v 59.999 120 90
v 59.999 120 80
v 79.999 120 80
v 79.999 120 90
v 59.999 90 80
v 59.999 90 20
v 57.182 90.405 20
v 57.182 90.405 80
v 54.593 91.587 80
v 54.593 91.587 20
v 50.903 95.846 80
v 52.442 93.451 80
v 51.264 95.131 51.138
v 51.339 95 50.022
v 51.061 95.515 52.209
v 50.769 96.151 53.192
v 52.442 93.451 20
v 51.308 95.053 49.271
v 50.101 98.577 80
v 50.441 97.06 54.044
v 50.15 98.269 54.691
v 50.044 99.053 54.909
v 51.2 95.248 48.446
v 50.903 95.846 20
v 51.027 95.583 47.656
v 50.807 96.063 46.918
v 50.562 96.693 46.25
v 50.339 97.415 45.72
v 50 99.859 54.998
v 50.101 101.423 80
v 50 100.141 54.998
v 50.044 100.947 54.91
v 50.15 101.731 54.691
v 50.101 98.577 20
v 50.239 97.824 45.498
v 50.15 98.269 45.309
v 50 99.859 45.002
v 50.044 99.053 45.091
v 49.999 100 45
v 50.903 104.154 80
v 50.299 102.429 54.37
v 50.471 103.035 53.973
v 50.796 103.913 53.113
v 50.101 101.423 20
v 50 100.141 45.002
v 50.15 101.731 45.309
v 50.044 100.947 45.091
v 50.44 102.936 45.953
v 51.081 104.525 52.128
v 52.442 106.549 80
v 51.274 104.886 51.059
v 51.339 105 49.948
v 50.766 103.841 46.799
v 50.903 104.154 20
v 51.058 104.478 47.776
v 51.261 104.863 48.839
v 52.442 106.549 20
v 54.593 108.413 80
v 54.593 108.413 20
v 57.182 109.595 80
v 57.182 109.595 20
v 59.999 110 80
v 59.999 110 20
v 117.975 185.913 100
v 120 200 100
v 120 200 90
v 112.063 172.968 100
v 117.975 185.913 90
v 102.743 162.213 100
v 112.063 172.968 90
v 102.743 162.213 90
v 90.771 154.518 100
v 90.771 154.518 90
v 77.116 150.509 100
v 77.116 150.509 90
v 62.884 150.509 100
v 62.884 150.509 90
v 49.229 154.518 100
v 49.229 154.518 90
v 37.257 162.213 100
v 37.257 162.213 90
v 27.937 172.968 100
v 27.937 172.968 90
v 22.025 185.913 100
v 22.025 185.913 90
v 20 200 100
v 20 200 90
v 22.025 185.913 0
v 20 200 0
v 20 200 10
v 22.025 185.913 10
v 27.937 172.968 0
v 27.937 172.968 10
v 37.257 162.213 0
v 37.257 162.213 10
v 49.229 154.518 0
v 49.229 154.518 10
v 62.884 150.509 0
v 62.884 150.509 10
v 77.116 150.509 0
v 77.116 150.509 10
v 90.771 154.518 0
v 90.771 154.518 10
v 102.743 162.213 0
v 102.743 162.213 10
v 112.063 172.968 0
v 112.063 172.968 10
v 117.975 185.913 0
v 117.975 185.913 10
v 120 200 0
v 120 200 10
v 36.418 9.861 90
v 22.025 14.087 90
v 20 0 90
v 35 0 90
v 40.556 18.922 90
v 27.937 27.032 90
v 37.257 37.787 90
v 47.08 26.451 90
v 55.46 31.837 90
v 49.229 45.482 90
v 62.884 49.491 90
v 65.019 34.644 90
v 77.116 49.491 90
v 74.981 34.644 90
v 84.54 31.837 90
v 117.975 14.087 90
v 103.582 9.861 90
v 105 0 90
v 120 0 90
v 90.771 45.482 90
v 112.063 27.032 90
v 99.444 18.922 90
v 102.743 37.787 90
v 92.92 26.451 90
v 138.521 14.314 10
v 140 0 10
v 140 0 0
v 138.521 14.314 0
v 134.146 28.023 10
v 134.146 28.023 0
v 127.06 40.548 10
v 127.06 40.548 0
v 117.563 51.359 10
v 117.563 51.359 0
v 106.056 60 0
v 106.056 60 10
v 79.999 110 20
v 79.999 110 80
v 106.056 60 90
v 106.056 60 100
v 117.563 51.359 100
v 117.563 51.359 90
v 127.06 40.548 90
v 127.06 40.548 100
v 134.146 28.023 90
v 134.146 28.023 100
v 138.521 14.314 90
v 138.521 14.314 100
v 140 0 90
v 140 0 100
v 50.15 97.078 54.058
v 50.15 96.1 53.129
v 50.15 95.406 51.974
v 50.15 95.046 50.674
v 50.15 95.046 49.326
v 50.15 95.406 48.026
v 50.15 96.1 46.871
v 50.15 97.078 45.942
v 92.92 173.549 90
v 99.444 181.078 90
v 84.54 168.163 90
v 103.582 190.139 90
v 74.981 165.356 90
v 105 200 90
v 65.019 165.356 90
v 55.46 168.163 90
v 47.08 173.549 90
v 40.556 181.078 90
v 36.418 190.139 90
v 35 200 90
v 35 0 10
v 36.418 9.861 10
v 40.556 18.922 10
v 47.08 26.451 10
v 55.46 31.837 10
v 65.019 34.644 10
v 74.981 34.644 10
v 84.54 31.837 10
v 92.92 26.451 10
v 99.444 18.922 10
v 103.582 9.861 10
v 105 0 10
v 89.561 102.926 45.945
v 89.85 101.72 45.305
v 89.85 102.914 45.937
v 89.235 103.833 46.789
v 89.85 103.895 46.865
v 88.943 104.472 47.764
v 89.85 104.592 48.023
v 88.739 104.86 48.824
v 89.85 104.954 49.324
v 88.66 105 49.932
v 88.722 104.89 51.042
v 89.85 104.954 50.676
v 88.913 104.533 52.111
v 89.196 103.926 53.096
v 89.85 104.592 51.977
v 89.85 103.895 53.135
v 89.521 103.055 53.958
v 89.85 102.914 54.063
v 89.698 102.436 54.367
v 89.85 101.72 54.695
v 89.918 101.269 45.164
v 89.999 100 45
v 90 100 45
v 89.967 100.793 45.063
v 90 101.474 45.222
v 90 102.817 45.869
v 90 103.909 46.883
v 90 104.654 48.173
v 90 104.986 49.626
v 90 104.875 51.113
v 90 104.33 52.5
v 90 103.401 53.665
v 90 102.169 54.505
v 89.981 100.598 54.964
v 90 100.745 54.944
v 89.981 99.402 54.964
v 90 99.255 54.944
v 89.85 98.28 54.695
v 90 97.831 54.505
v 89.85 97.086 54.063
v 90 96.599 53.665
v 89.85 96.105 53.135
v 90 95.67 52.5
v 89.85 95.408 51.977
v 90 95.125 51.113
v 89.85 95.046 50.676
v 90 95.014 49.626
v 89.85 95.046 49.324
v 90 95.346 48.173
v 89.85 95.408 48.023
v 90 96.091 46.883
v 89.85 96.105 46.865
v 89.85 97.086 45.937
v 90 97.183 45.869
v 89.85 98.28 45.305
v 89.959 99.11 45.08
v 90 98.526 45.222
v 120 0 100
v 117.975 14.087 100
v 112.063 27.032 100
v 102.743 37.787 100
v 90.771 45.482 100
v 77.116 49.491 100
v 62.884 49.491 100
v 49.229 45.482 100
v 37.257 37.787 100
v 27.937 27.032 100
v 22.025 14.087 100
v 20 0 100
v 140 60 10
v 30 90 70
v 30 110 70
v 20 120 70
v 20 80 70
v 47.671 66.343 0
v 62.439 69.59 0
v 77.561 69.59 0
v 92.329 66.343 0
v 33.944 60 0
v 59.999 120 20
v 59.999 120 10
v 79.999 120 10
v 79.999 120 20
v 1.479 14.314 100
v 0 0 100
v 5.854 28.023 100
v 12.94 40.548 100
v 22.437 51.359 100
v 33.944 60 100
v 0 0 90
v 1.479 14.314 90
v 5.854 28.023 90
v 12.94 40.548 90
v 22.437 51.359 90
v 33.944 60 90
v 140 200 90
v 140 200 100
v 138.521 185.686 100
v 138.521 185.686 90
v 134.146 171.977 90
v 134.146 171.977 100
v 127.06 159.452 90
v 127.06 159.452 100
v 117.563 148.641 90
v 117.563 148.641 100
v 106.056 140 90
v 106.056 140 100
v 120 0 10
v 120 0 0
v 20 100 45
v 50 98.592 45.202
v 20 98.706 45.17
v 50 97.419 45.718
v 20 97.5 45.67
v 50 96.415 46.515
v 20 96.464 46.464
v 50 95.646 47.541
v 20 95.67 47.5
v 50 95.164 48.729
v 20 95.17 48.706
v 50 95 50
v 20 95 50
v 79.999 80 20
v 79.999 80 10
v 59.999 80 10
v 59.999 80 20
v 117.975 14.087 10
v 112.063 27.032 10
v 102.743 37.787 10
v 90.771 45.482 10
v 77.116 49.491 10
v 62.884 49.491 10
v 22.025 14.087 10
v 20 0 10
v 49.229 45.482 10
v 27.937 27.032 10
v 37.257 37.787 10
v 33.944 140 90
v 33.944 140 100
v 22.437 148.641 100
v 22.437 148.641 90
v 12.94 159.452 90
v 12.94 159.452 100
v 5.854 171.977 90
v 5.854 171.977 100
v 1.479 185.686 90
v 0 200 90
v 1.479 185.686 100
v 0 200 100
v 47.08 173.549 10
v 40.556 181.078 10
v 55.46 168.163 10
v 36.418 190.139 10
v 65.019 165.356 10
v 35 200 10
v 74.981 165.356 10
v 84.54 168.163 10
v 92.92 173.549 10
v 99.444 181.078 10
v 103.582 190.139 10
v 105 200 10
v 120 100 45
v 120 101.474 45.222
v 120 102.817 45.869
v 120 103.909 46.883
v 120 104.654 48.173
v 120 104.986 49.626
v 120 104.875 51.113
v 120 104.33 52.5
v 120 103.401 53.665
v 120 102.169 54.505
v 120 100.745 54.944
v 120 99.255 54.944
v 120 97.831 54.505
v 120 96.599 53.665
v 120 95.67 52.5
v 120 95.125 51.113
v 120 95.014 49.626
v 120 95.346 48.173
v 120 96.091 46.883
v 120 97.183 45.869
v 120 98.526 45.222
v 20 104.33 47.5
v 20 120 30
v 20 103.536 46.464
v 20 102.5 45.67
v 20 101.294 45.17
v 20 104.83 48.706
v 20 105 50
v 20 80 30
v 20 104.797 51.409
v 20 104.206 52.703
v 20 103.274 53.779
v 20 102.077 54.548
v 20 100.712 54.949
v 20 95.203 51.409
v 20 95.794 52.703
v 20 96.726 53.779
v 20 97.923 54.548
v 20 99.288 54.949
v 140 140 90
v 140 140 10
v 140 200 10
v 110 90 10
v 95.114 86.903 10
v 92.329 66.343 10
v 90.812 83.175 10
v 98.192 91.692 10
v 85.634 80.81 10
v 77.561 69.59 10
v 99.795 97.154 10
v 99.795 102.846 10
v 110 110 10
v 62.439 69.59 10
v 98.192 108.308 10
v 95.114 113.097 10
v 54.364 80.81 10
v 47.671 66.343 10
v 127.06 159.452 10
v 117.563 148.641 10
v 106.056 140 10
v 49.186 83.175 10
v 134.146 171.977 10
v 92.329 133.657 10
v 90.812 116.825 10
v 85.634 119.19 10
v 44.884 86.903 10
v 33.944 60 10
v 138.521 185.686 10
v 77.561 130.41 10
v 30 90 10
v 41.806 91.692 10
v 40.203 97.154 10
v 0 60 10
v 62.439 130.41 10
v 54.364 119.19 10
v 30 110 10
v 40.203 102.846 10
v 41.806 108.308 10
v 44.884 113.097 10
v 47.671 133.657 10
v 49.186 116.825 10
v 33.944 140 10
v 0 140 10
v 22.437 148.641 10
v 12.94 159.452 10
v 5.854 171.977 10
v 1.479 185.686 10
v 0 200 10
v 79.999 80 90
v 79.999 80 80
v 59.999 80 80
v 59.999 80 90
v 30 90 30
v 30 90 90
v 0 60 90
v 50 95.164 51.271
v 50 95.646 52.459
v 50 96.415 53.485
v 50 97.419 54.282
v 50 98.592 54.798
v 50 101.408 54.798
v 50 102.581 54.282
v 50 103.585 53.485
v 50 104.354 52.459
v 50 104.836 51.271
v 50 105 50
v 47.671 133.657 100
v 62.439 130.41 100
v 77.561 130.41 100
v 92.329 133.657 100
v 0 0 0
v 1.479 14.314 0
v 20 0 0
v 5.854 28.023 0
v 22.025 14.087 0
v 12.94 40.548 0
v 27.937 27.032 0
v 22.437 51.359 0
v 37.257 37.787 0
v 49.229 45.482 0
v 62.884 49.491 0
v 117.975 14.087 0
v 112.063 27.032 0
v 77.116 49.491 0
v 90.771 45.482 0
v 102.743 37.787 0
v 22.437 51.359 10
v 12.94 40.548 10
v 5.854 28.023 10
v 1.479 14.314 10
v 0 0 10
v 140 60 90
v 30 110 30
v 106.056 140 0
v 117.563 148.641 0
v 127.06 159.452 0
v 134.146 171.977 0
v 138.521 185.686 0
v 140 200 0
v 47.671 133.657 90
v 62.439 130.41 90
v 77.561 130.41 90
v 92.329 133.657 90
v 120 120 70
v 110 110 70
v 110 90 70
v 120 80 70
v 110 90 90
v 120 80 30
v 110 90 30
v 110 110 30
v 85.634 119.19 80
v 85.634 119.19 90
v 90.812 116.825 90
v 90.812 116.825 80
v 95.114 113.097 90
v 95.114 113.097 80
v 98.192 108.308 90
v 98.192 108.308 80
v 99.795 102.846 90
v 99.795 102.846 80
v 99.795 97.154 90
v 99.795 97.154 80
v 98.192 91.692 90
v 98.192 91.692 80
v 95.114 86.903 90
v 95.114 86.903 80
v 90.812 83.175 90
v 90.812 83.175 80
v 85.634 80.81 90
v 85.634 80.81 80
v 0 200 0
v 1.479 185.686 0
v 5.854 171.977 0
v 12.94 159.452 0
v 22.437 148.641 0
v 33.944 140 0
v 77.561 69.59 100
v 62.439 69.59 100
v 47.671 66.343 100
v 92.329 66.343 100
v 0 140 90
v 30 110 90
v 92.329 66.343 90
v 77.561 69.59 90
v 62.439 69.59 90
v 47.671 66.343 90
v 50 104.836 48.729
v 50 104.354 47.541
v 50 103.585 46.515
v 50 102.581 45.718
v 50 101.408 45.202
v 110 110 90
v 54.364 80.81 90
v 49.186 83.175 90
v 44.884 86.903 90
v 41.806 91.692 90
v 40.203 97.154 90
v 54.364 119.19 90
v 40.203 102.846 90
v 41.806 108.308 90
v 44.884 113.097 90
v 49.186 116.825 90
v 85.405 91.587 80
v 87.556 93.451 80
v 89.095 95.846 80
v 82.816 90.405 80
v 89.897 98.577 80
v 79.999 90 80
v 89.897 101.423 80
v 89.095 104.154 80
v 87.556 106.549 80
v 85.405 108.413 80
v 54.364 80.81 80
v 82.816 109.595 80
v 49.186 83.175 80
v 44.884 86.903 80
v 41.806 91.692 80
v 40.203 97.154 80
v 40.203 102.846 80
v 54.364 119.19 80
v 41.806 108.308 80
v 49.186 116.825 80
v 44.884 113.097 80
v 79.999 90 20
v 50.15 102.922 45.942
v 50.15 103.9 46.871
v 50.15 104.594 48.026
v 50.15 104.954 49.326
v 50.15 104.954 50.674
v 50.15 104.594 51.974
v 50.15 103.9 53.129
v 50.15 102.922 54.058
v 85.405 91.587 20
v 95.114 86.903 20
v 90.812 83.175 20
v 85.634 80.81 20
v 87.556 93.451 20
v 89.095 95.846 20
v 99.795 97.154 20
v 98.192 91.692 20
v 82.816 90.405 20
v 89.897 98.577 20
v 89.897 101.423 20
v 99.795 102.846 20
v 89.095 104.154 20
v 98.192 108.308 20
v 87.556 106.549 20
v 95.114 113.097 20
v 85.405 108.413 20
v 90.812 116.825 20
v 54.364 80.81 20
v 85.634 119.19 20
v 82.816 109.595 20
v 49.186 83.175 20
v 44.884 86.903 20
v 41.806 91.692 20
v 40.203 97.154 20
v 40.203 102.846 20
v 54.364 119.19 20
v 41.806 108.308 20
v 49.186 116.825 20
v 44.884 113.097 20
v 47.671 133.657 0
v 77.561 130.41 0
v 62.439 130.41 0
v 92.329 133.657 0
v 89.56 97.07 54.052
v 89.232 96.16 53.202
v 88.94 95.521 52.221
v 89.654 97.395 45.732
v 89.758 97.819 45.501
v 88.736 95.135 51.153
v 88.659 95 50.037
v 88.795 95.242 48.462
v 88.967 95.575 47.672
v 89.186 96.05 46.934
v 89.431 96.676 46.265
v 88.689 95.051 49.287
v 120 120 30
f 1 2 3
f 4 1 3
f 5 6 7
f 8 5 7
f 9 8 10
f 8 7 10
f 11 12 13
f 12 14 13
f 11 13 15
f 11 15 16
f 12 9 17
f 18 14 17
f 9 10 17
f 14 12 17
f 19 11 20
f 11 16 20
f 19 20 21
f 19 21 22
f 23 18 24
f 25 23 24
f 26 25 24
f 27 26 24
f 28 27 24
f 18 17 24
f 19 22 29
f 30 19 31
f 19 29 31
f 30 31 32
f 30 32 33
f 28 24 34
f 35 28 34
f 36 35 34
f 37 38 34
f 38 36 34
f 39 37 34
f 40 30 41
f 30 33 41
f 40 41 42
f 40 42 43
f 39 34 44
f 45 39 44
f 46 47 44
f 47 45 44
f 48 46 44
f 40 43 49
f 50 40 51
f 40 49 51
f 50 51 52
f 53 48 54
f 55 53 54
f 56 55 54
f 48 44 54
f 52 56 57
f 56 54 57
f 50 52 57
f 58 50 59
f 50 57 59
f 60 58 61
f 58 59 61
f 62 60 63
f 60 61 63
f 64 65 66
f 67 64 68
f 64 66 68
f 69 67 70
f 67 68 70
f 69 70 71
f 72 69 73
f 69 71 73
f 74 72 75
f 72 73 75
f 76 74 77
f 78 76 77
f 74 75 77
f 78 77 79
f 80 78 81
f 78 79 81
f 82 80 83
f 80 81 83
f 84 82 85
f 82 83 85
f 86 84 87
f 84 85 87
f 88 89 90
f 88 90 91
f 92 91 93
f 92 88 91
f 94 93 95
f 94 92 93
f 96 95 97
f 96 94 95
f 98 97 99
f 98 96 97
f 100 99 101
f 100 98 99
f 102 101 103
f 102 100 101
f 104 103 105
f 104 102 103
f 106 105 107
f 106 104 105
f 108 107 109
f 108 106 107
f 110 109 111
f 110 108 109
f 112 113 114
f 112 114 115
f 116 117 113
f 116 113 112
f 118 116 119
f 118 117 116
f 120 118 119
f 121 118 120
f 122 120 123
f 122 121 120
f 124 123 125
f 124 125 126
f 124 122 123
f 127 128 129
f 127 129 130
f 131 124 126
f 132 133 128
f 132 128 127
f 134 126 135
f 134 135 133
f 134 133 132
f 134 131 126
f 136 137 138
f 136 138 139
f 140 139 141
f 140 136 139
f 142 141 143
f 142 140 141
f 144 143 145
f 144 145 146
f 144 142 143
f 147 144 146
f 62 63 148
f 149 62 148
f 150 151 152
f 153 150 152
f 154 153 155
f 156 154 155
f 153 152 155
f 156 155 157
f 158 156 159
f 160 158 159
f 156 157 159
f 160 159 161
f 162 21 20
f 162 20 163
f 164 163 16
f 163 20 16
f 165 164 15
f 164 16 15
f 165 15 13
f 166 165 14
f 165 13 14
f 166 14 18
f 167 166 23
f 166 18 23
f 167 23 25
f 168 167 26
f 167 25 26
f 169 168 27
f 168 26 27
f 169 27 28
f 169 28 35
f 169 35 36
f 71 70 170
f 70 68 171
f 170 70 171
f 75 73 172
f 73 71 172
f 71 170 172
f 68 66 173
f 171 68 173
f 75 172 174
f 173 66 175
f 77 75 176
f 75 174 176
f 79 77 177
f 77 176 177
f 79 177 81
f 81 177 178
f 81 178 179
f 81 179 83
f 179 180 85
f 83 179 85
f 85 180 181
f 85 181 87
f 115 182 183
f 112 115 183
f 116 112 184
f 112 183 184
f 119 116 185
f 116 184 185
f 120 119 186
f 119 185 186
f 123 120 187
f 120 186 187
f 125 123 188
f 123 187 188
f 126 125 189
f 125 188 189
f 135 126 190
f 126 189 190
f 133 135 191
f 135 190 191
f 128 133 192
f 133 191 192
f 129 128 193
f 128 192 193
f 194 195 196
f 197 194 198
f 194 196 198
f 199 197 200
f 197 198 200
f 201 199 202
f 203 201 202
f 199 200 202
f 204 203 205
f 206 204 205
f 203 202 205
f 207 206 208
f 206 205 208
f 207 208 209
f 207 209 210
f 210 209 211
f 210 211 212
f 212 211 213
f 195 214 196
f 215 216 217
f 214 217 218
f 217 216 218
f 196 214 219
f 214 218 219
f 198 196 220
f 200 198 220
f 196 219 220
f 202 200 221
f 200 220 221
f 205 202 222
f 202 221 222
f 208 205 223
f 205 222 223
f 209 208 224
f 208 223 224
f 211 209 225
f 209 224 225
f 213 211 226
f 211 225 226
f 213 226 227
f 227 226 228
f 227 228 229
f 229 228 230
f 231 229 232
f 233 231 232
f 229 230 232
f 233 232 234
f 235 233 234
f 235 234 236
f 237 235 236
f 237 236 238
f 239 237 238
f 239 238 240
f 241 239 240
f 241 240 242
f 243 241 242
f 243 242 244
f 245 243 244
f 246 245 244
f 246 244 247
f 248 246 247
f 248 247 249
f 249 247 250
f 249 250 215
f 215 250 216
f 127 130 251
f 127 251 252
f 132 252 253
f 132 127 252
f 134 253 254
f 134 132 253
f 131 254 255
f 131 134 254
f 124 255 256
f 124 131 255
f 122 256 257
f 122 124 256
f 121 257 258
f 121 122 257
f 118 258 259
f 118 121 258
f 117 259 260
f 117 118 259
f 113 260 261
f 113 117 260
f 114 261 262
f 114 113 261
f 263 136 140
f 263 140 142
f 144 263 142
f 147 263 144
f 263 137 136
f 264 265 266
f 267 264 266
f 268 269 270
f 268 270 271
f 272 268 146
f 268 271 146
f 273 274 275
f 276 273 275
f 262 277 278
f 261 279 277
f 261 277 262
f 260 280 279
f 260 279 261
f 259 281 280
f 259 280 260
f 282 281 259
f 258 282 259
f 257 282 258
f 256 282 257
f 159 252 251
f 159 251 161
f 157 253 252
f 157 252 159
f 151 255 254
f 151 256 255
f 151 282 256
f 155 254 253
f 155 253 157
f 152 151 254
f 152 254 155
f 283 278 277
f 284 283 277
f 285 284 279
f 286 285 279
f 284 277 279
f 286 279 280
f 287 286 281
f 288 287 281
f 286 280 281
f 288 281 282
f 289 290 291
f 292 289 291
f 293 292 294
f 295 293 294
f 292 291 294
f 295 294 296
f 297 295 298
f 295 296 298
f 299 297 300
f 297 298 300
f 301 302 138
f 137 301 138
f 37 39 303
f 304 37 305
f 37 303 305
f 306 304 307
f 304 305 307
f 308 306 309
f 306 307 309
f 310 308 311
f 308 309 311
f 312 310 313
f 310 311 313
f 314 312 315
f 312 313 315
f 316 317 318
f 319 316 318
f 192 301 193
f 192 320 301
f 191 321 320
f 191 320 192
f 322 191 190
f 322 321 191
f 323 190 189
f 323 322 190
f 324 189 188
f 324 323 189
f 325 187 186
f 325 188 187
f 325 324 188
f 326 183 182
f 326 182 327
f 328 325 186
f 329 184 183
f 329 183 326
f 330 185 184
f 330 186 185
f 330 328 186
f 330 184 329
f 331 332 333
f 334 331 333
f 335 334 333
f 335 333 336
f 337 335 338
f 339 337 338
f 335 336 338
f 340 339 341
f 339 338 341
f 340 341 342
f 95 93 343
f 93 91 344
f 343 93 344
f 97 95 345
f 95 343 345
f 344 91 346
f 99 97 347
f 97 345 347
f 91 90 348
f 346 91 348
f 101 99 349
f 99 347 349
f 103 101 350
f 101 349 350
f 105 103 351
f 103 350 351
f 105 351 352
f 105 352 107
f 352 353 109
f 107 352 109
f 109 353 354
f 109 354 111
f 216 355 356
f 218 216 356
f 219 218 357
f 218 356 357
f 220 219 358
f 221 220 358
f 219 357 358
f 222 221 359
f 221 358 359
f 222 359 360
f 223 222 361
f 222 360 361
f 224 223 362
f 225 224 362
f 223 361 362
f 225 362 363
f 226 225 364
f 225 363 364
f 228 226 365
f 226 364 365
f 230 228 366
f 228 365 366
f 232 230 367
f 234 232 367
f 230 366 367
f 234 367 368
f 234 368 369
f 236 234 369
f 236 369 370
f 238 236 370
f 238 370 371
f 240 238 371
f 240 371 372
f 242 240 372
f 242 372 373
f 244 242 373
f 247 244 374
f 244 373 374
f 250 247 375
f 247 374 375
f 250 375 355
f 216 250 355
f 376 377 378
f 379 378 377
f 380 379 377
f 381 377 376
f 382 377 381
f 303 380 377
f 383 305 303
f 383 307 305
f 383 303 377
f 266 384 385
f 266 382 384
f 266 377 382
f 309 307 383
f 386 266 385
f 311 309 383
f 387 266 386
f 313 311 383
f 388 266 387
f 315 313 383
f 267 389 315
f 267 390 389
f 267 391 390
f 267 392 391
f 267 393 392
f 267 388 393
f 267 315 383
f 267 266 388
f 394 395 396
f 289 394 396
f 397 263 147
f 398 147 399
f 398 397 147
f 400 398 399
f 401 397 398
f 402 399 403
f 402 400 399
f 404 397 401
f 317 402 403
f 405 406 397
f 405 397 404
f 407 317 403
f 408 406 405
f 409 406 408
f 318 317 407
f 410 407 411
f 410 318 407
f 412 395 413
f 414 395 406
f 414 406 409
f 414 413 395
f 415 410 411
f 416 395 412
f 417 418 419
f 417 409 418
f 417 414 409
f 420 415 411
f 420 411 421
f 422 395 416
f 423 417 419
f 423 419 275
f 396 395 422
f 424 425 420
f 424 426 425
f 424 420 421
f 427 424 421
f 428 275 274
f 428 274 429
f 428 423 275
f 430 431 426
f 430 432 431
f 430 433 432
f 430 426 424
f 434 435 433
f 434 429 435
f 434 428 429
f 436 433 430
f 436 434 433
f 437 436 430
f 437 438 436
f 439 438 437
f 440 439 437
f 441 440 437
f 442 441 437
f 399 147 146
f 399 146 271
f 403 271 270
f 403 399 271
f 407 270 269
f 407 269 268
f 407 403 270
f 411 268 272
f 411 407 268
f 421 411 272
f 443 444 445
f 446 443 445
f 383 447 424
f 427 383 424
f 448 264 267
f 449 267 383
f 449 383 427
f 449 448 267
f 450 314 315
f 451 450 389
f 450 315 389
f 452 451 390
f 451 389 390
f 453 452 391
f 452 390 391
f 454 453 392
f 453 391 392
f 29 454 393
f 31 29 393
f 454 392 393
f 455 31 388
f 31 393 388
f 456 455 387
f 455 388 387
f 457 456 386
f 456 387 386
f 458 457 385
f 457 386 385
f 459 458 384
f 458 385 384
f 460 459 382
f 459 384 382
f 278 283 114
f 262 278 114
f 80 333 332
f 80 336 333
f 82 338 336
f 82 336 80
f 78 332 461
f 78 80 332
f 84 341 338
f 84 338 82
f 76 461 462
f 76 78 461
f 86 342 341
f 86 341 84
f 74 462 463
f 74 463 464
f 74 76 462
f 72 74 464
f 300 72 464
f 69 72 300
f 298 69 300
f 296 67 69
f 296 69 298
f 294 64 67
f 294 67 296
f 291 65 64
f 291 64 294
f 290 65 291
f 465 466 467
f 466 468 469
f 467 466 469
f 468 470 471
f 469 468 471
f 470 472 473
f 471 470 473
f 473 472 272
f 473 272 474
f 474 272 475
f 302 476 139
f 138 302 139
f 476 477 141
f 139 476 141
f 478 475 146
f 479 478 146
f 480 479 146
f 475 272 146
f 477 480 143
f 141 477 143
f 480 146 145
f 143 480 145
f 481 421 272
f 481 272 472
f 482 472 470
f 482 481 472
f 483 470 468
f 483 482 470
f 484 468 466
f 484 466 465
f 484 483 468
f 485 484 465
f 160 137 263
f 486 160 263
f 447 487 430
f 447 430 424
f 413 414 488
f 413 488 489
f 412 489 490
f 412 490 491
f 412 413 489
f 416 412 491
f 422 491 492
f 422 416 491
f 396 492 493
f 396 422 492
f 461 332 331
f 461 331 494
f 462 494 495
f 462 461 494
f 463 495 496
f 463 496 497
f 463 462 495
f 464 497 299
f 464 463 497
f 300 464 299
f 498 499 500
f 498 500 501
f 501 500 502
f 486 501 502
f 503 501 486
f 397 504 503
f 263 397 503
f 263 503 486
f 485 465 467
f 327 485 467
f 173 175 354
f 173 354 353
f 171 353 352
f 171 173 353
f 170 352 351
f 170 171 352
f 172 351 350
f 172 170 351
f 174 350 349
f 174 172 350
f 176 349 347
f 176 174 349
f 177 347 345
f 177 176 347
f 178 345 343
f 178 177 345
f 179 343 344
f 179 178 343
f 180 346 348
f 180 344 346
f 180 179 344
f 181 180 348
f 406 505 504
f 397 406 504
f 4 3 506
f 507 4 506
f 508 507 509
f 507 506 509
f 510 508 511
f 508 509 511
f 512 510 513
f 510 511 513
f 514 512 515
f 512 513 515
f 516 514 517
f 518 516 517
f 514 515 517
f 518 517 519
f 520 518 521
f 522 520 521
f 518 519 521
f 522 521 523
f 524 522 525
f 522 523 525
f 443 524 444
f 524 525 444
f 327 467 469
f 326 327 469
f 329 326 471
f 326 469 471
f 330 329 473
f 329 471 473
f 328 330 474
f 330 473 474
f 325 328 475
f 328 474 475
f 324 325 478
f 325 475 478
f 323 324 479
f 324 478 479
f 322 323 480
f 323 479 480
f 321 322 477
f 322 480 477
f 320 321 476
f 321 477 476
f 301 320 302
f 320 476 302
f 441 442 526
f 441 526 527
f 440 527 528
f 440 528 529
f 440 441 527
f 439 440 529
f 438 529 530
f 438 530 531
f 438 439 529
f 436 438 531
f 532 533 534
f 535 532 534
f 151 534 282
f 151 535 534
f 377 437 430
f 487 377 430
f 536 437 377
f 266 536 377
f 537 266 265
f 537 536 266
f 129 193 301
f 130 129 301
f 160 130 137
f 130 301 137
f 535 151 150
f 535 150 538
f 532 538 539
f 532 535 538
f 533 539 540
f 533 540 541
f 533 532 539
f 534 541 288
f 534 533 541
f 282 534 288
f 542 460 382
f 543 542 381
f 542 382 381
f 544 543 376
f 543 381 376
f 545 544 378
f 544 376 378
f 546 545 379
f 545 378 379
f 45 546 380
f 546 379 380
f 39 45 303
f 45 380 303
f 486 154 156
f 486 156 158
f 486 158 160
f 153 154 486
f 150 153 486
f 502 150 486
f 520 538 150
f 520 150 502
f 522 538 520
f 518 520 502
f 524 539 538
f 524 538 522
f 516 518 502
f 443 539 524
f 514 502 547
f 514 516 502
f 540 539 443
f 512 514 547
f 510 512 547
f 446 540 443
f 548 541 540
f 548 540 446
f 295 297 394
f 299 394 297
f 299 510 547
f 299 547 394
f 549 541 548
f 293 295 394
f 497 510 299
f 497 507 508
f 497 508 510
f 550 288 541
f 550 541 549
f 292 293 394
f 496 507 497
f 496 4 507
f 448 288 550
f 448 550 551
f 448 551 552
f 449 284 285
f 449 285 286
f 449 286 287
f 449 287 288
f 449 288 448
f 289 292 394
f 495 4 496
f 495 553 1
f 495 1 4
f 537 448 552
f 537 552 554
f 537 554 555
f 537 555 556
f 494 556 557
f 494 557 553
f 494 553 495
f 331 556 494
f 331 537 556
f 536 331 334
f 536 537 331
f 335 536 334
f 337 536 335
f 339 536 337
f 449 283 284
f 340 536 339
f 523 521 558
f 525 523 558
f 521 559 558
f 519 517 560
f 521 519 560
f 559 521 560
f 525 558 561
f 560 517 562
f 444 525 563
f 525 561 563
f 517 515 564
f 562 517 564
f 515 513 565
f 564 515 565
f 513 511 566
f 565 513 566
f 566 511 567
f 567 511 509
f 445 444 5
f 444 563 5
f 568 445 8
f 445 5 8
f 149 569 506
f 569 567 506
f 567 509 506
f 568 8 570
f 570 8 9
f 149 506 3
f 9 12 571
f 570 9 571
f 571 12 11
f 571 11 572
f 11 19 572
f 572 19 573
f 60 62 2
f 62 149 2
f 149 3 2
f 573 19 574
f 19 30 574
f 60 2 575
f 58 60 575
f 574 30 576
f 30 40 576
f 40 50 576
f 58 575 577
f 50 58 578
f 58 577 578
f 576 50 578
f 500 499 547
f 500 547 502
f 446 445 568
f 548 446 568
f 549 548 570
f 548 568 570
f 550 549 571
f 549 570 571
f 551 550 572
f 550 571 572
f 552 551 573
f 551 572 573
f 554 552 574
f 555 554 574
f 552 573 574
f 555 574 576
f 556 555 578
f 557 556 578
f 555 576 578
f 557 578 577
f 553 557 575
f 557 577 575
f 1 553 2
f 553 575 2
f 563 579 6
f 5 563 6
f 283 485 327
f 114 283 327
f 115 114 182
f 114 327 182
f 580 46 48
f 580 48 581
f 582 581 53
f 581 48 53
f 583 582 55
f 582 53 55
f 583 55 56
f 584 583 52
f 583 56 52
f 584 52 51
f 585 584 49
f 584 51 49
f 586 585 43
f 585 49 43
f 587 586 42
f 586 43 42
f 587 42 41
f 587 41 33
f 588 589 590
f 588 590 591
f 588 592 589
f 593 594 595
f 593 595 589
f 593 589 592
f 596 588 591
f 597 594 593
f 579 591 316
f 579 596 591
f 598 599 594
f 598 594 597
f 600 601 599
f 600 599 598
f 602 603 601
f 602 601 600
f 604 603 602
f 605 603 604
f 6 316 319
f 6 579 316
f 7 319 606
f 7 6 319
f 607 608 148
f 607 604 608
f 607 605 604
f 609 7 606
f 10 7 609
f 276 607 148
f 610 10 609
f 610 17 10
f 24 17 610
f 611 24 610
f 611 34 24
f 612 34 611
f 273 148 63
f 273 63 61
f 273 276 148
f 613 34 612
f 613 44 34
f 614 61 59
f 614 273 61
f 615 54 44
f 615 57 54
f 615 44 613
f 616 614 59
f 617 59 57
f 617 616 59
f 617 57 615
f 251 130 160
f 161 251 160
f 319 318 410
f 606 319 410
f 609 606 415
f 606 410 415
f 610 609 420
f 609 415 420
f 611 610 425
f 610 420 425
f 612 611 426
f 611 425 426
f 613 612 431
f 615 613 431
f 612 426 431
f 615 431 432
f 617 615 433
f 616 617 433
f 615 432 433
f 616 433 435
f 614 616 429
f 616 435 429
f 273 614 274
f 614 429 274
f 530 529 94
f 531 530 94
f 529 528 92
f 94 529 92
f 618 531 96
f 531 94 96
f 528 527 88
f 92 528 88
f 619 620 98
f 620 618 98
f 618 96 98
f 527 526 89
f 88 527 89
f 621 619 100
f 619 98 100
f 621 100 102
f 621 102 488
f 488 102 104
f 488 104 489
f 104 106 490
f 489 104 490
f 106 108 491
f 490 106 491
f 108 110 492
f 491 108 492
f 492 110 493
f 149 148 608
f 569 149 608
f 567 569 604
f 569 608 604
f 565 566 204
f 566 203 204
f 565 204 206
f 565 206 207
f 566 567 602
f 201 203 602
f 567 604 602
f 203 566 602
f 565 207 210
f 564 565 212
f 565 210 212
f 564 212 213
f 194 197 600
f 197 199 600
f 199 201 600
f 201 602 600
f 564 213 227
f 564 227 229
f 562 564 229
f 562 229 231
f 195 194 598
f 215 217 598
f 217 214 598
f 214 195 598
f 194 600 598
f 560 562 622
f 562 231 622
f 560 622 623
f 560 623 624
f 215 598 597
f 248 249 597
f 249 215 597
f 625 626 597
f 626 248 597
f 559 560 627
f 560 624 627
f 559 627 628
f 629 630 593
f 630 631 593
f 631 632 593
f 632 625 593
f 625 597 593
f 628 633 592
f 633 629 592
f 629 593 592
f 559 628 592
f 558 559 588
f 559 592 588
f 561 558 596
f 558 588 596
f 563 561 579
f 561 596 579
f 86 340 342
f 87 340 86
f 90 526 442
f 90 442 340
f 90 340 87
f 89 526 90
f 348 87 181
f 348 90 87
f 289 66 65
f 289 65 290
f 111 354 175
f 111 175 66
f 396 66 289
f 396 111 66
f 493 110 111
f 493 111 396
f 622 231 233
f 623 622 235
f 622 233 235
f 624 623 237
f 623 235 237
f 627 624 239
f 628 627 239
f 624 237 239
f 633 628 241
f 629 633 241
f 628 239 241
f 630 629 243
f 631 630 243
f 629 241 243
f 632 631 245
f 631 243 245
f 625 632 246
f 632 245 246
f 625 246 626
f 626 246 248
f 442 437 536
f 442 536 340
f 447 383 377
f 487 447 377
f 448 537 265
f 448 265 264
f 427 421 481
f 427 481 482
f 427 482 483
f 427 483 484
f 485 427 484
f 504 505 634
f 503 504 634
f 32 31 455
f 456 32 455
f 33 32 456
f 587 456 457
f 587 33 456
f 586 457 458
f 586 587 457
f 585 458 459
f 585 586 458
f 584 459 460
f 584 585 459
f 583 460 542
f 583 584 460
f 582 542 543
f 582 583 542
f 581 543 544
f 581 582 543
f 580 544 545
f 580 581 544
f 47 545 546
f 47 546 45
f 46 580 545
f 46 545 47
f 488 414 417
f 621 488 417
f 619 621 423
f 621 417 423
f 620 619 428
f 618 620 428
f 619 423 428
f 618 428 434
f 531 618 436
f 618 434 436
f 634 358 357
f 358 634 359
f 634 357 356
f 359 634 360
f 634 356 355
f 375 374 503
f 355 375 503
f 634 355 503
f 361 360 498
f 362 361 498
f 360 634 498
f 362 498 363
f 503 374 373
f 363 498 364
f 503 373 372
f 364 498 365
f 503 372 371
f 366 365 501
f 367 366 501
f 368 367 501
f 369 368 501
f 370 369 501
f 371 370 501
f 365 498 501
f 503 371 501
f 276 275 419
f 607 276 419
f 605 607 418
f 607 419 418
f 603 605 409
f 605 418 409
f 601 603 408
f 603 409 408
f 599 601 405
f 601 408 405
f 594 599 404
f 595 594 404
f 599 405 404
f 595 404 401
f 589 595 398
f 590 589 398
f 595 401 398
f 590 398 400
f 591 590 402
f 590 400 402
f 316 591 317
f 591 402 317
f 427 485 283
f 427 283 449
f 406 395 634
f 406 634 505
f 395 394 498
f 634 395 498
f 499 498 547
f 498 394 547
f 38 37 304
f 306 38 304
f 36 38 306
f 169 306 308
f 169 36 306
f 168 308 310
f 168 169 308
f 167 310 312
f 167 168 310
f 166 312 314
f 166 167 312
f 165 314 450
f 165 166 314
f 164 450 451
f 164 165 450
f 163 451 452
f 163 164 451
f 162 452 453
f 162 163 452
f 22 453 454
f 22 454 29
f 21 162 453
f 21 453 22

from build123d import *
from build123d.topology import SkipClean

# Parameters (mm, degrees)
SKETCH1_W           = 140
SKETCH1_H           = 200
BOSS_EXTRUDE1_DEPTH = 100
CUT_EXTRUDE1_DEPTH  = 100
CUT_EXTRUDE2_DEPTH  = 100
BOSS_EXTRUDE2_DEPTH = 10
CUT_EXTRUDE7_DEPTH  = 30
CUT_EXTRUDE8_DEPTH  = 10
CUT_EXTRUDE9_DEPTH  = 50
CUT_EXTRUDE10_DEPTH = 50
CUT_EXTRUDE11_DEPTH = 10
CUT_EXTRUDE12_START = -10
CUT_EXTRUDE12_DEPTH = 10
CUT_EXTRUDE13_DEPTH = 141
SKETCH19_R          = 5
CUT_EXTRUDE16_DEPTH = 30
CUT_EXTRUDE18_DEPTH = 60
CUT_EXTRUDE19_DEPTH = 10
SKETCH27_W          = 10
SKETCH27_H          = 80
CUT_EXTRUDE25_DEPTH = 177
CUT_EXTRUDE26_DEPTH = 10
SKETCH29_W          = 72.11102551
SKETCH29_H          = 10
EXTRUDE_THIN1_DEPTH = 10
CUT_EXTRUDE27_START = -10
CUT_EXTRUDE27_DEPTH = 10
BOSS_EXTRUDE4_START = -10
BOSS_EXTRUDE4_DEPTH = 10
CUT_EXTRUDE28_DEPTH = 150
CUT_EXTRUDE29_DEPTH = 10
BOSS_EXTRUDE5_DEPTH = 10
CUT_EXTRUDE30_START = -10
CUT_EXTRUDE30_DEPTH = 10
CUT_EXTRUDE31_START = -10
CUT_EXTRUDE31_DEPTH = 10
BOSS_EXTRUDE6_START = -10
BOSS_EXTRUDE6_DEPTH = 10
CUT_EXTRUDE32_DEPTH = 10
CUT_EXTRUDE33_DEPTH = 49
CUT_EXTRUDE34_START = -10
CUT_EXTRUDE34_DEPTH = 10
CUT_EXTRUDE42_START = -30.15
SKETCH43_R          = 5
CUT_EXTRUDE42_DEPTH = 30.15
SKETCH44_R          = 5
CUT_EXTRUDE43_DEPTH = 30.15
SKETCH45_R          = 5
CUT_EXTRUDE44_DEPTH = 120


with BuildPart() as part:
    # Sketch1 → Boss-Extrude1 (new body)
    with BuildSketch(Plane.XY):
        with Locations((70, 100)):
            Rectangle(SKETCH1_W, SKETCH1_H)
    extrude(amount=BOSS_EXTRUDE1_DEPTH)

    # Sketch2 → Cut-Extrude1 (cut)
    with BuildSketch(Plane.XY.offset(100)):
        Polygon((0, 140), (20, 120), (20, 80), (0, 60), align=None)
        Polygon((140, 140), (120, 120), (120, 80), (140, 60), align=None)
    extrude(amount=-CUT_EXTRUDE1_DEPTH, mode=Mode.SUBTRACT)

    # Sketch4 → Cut-Extrude2 (cut)
    with BuildSketch(Plane.XY.offset(30)):
        Polygon((20, 120), (30, 110), (30, 90), (20, 80), align=None)
    extrude(amount=-CUT_EXTRUDE2_DEPTH, mode=Mode.SUBTRACT)

    # Sketch9 → Boss-Extrude2 (add)
    with BuildSketch(Plane(origin=(0, 0, 30), x_dir=(-1, 0, 0), z_dir=(0, 0, -1))):
        Polygon((-30, 110), (-20, 120), (-20, 80), (-30, 90), align=None)
    extrude(amount=BOSS_EXTRUDE2_DEPTH)

    # Sketch10 → Cut-Extrude7 (cut)
    with BuildSketch(Plane.XY.offset(100)):
        Polygon((20, 120), (30, 110), (30, 90), (20, 80), align=None)
    extrude(amount=-CUT_EXTRUDE7_DEPTH, mode=Mode.SUBTRACT)

    # Sketch11 → Cut-Extrude8 (cut)
    with BuildSketch(Plane(origin=(0, 0, 20), x_dir=(-1, 0, 0), z_dir=(0, 0, -1))):
        Polygon((-30, 110), (-20, 120), (-20, 80), (-30, 90), align=None)
    extrude(amount=-CUT_EXTRUDE8_DEPTH, mode=Mode.SUBTRACT)

    # Sketch13 → Cut-Extrude9 (cut)
    with BuildSketch(Plane.XY.offset(70)):
        Polygon((120, 120), (110, 110), (110, 90), (120, 80), align=None)
    extrude(amount=CUT_EXTRUDE9_DEPTH, mode=Mode.SUBTRACT)

    # Sketch14 → Cut-Extrude10 (cut)
    with BuildSketch(Plane.XY.offset(30)):
        Polygon((120, 120), (110, 110), (110, 90), (120, 80), align=None)
    extrude(amount=-CUT_EXTRUDE10_DEPTH, mode=Mode.SUBTRACT)

    # Sketch15 → Cut-Extrude11 (cut)
    with BuildSketch(Plane(origin=(0, 0, 0), x_dir=(-1, 0, 0), z_dir=(0, 0, -1))):
        with BuildLine():
            Line((-120, 200), (-20, 200))
            ThreePointArc((-20, 200), (-70, 150), (-120, 200))
        make_face()
    extrude(amount=-CUT_EXTRUDE11_DEPTH, mode=Mode.SUBTRACT)

    # Sketch16 → Cut-Extrude12 (cut)
    with BuildSketch(Plane.XY.offset(100).offset(CUT_EXTRUDE12_START)):
        with BuildLine():
            Line((20, 200), (120, 200))
            ThreePointArc((120, 200), (70, 150), (20, 200))
        make_face()
    extrude(amount=CUT_EXTRUDE12_DEPTH, mode=Mode.SUBTRACT)

    # Sketch17 → Cut-Extrude13 (cut)
    with BuildSketch(Plane.XY.offset(90)):
        with BuildLine():
            Line((35, 200), (105, 200))
            ThreePointArc((105, 200), (70, 165), (35, 200))
        make_face()
    extrude(amount=-CUT_EXTRUDE13_DEPTH, mode=Mode.SUBTRACT)

    # Sketch19 → Cut-Extrude16 (cut)
    with BuildSketch(Plane(origin=(120, 0, 0), x_dir=(0, 0, -1), z_dir=(1, 0, 0))):
        with Locations((-50, 100)):
            Circle(SKETCH19_R)
    extrude(amount=-CUT_EXTRUDE16_DEPTH, mode=Mode.SUBTRACT)

    # Sketch20 → Cut-Extrude18 (cut)
    with BuildSketch(Plane.XY.offset(20)):
        with BuildLine():
            Line((59.999, 110), (79.999, 110))
            ThreePointArc((79.999, 110), (89.999, 100), (79.999, 90))
            Line((79.999, 90), (59.999, 90))
            ThreePointArc((59.999, 90), (49.999, 100), (59.999, 110))
        make_face()
    extrude(amount=CUT_EXTRUDE18_DEPTH, mode=Mode.SUBTRACT)

    # Sketch21 → Cut-Extrude19 (cut)
    with BuildSketch(Plane.XY.offset(10)):
        with BuildLine():
            Line((59.999, 120), (79.999, 120))
            ThreePointArc((79.999, 120), (99.999, 100), (79.999, 80))
            Line((79.999, 80), (59.999, 80))
            ThreePointArc((59.999, 80), (39.999, 100), (59.999, 120))
        make_face()
    extrude(amount=CUT_EXTRUDE19_DEPTH, mode=Mode.SUBTRACT)

    # Sketch27 → Cut-Extrude25 (cut)
    with BuildSketch(Plane(origin=(0, 0, 0), x_dir=(0, 0, -1), z_dir=(1, 0, 0))):
        with Locations((-95, 100)):
            Rectangle(SKETCH27_W, SKETCH27_H)
        with Locations((-5, 100)):
            Rectangle(SKETCH27_W, SKETCH27_H)
    extrude(amount=CUT_EXTRUDE25_DEPTH, mode=Mode.SUBTRACT)

    # Sketch28 → Cut-Extrude26 (cut)
    with BuildSketch(Plane.XY.offset(100)):
        with BuildLine():
            ThreePointArc((33.944487245, 140), (9.074283374, 165.531796484), (0, 200))
            Line((0, 200), (0, 140))
            Line((0, 140), (33.944487245, 140))
        make_face()
        with BuildLine():
            ThreePointArc((140, 200), (130.925716626, 165.531796484), (106.055512755, 140))
            Line((106.055512755, 140), (140, 140))
            Line((140, 140), (140, 200))
        make_face()
    extrude(amount=-CUT_EXTRUDE26_DEPTH, mode=Mode.SUBTRACT)

    # Sketch29 → Extrude-Thin1 (add)
    with BuildSketch(Plane.XY.offset(100)):
        with Locations((70, 145)):
            Rectangle(SKETCH29_W, SKETCH29_H)
        with BuildLine():
            ThreePointArc((140, 200), (70, 130), (0, 200))
            Line((0, 200), (10, 200))
            ThreePointArc((10, 200), (70, 140), (130, 200))
            Line((130, 200), (140, 200))
        make_face()
    extrude(amount=-EXTRUDE_THIN1_DEPTH)

    # Sketch30 → Cut-Extrude27 (cut)
    with BuildSketch(Plane(origin=(0, 0, 0), x_dir=(-1, 0, 0), z_dir=(0, 0, -1)).offset(CUT_EXTRUDE27_START)):
        with BuildLine():
            ThreePointArc((-106.055512755, 140), (-130.925716626, 165.531796484), (-140, 200))
            Line((-140, 200), (-140, 140))
            Line((-140, 140), (-106.055512755, 140))
        make_face()
        with BuildLine():
            ThreePointArc((0, 200), (-9.074283374, 165.531796484), (-33.944487245, 140))
            Line((-33.944487245, 140), (0, 140))
            Line((0, 140), (0, 200))
        make_face()
    extrude(amount=CUT_EXTRUDE27_DEPTH, mode=Mode.SUBTRACT)

    # Sketch31 → Boss-Extrude4 (add)
    with BuildSketch(Plane(origin=(0, 0, 0), x_dir=(-1, 0, 0), z_dir=(0, 0, -1)).offset(BOSS_EXTRUDE4_START)):
        with BuildLine():
            Line((0, 200), (-20, 200))
            ThreePointArc((-20, 200), (-70, 150), (-120, 200))
            Line((-120, 200), (-140, 200))
            ThreePointArc((-140, 200), (-70, 130), (0, 200))
        make_face()
    extrude(amount=BOSS_EXTRUDE4_DEPTH)

    # Sketch32 → Cut-Extrude28 (cut)
    with BuildSketch(Plane(origin=(0, 0, 0), x_dir=(-1, 0, 0), z_dir=(0, 0, -1))):
        with BuildLine():
            Line((-105, 0), (-35, 0))
            ThreePointArc((-35, 0), (-70, 35), (-105, 0))
        make_face()
    extrude(amount=-CUT_EXTRUDE28_DEPTH, mode=Mode.SUBTRACT)

    # Sketch33 → Cut-Extrude29 (cut)
    with BuildSketch(Plane.XY.offset(100)):
        with BuildLine():
            Line((0, 60), (0, 0))
            ThreePointArc((0, 0), (9.074283374, 34.468203516), (33.944487245, 60))
            Line((33.944487245, 60), (0, 60))
        make_face()
        with BuildLine():
            ThreePointArc((106.055512755, 60), (130.925716626, 34.468203516), (140, 0))
            Line((140, 0), (140, 60))
            Line((140, 60), (106.055512755, 60))
        make_face()
    extrude(amount=-CUT_EXTRUDE29_DEPTH, mode=Mode.SUBTRACT)

    # Sketch34 → Boss-Extrude5 (add)
    with SkipClean():  # the faces are left unmerged after this step: merging them gives an invalid solid
        with BuildSketch(Plane.XY.offset(100)):
            with BuildLine():
                Line((105, 0), (140, 0))
                ThreePointArc((140, 0), (70, 70), (0, 0))
                Line((0, 0), (35, 0))
                ThreePointArc((35, 0), (70, 35), (105, 0))
            make_face()
        extrude(amount=-BOSS_EXTRUDE5_DEPTH)

    # Sketch35 → Cut-Extrude30 (cut)
    with SkipClean():  # the faces are left unmerged after this step: merging them gives an invalid solid
        with BuildSketch(Plane.XY.offset(100).offset(CUT_EXTRUDE30_START)):
            with BuildLine():
                ThreePointArc((120, 0), (70, 50), (20, 0))
                Line((20, 0), (35, 0))
                ThreePointArc((35, 0), (70, 35), (105, 0))
                Line((105, 0), (120, 0))
            make_face()
        extrude(amount=CUT_EXTRUDE30_DEPTH, mode=Mode.SUBTRACT)

    # Sketch36 → Cut-Extrude31 (cut)
    with SkipClean():  # the faces are left unmerged after this step: merging them gives an invalid solid
        with BuildSketch(Plane(origin=(0, 0, 0), x_dir=(-1, 0, 0), z_dir=(0, 0, -1)).offset(CUT_EXTRUDE31_START)):
            with BuildLine():
                Line((-140, 60), (-140, 0))
                ThreePointArc((-140, 0), (-130.925716626, 34.468203516), (-106.055512755, 60))
                Line((-106.055512755, 60), (-140, 60))
            make_face()
            with BuildLine():
                Line((0, 60), (-33.944487245, 60))
                ThreePointArc((-33.944487245, 60), (-9.074283374, 34.468203516), (0, 0))
                Line((0, 0), (0, 60))
            make_face()
        extrude(amount=CUT_EXTRUDE31_DEPTH, mode=Mode.SUBTRACT)

    # Sketch37 → Boss-Extrude6 (add)
    with SkipClean():  # the faces are left unmerged after this step: merging them gives an invalid solid
        with BuildSketch(Plane(origin=(0, 0, 0), x_dir=(-1, 0, 0), z_dir=(0, 0, -1)).offset(BOSS_EXTRUDE6_START)):
            with BuildLine():
                Line((-105, 0), (-140, 0))
                ThreePointArc((-140, 0), (-70, 70), (0, 0))
                Line((0, 0), (-35, 0))
                ThreePointArc((-35, 0), (-70, 35), (-105, 0))
            make_face()
        extrude(amount=BOSS_EXTRUDE6_DEPTH)

    # Sketch38 → Cut-Extrude32 (cut)
    with SkipClean():  # the faces are left unmerged after this step: merging them gives an invalid solid
        with BuildSketch(Plane(origin=(0, 0, 0), x_dir=(-1, 0, 0), z_dir=(0, 0, -1))):
            with BuildLine():
                Line((-120, 0), (-105, 0))
                ThreePointArc((-105, 0), (-70, 35), (-35, 0))
                Line((-35, 0), (-20, 0))
                ThreePointArc((-20, 0), (-70, 50), (-120, 0))
            make_face()
        extrude(amount=-CUT_EXTRUDE32_DEPTH, mode=Mode.SUBTRACT)

    # Sketch39 → Cut-Extrude33 (cut)
    with SkipClean():  # the faces are left unmerged after this step: merging them gives an invalid solid
        with BuildSketch(Plane(origin=(0, 0, 80), x_dir=(-1, 0, 0), z_dir=(0, 0, -1))):
            with BuildLine():
                Line((-79.999, 110), (-59.999, 110))
                ThreePointArc((-59.999, 110), (-49.999, 100), (-59.999, 90))
                Line((-59.999, 90), (-79.999, 90))
                ThreePointArc((-79.999, 90), (-89.999, 100), (-79.999, 110))
            make_face()
        extrude(amount=-CUT_EXTRUDE33_DEPTH, mode=Mode.SUBTRACT)

    # Sketch40 → Cut-Extrude34 (cut)
    with SkipClean():  # the faces are left unmerged after this step: merging them gives an invalid solid
        with BuildSketch(Plane.XY.offset(90).offset(CUT_EXTRUDE34_START)):
            with BuildLine():
                Line((79.999, 80), (59.999, 80))
                ThreePointArc((59.999, 80), (39.999, 100), (59.999, 120))
                Line((59.999, 120), (79.999, 120))
                ThreePointArc((79.999, 120), (99.999, 100), (79.999, 80))
            make_face()
        extrude(amount=CUT_EXTRUDE34_DEPTH, mode=Mode.SUBTRACT)

    # Cut-Extrude15: read off the stored shape, not the designer's step
    # Cut-Extrude15: loft between two sections, ruled curve by curve
    with SkipClean():  # the faces are left unmerged after this step: merging them gives an invalid solid
        cut_extrude15_from = [
            Edge.make_three_point_arc((50, 95, 50), (50, 100, 55), (50, 105, 50)),
            Edge.make_three_point_arc((50, 105, 50), (50, 100, 45), (50, 95, 50)),
        ]
        cut_extrude15_to = [
            Edge.make_three_point_arc((20, 95, 50), (20, 100, 55), (20, 105, 50)),
            Edge.make_three_point_arc((20, 105, 50), (20, 100, 45), (20, 95, 50)),
        ]
        cut_extrude15 = Solid(Shell([*[Face.make_surface_from_curves(cut_extrude15_from[k], cut_extrude15_to[k]) for k in range(2)], Face(Wire(cut_extrude15_from)), Face(Wire(cut_extrude15_to))]))
        add(cut_extrude15, mode=Mode.SUBTRACT)

    # Sketch43 → Cut-Extrude42 (cut)
    with SkipClean():  # the faces are left unmerged after this step: merging them gives an invalid solid
        with BuildSketch(Plane.ZY.offset(-20).offset(CUT_EXTRUDE42_START)):
            with Locations(Location((50, 100, 0), (0, 0, 180))):
                Circle(SKETCH43_R)
        extrude(amount=CUT_EXTRUDE42_DEPTH, mode=Mode.SUBTRACT)

    # Sketch44 → Cut-Extrude43 (cut)
    with SkipClean():  # the faces are left unmerged after this step: merging them gives an invalid solid
        with BuildSketch(Plane(origin=(120, 0, 0), x_dir=(0, 0, -1), z_dir=(1, 0, 0))):
            with Locations((-50, 100)):
                Circle(SKETCH44_R)
        extrude(amount=-CUT_EXTRUDE43_DEPTH, mode=Mode.SUBTRACT)

    # Sketch45 → Cut-Extrude44 (cut)
    with SkipClean():  # the faces are left unmerged after this step: merging them gives an invalid solid
        with BuildSketch(Plane(origin=(120, 0, 0), x_dir=(0, 0, -1), z_dir=(1, 0, 0))):
            with Locations((-50, 100)):
                Circle(SKETCH45_R)
        extrude(amount=-CUT_EXTRUDE44_DEPTH, mode=Mode.SUBTRACT)


solid = part.part
